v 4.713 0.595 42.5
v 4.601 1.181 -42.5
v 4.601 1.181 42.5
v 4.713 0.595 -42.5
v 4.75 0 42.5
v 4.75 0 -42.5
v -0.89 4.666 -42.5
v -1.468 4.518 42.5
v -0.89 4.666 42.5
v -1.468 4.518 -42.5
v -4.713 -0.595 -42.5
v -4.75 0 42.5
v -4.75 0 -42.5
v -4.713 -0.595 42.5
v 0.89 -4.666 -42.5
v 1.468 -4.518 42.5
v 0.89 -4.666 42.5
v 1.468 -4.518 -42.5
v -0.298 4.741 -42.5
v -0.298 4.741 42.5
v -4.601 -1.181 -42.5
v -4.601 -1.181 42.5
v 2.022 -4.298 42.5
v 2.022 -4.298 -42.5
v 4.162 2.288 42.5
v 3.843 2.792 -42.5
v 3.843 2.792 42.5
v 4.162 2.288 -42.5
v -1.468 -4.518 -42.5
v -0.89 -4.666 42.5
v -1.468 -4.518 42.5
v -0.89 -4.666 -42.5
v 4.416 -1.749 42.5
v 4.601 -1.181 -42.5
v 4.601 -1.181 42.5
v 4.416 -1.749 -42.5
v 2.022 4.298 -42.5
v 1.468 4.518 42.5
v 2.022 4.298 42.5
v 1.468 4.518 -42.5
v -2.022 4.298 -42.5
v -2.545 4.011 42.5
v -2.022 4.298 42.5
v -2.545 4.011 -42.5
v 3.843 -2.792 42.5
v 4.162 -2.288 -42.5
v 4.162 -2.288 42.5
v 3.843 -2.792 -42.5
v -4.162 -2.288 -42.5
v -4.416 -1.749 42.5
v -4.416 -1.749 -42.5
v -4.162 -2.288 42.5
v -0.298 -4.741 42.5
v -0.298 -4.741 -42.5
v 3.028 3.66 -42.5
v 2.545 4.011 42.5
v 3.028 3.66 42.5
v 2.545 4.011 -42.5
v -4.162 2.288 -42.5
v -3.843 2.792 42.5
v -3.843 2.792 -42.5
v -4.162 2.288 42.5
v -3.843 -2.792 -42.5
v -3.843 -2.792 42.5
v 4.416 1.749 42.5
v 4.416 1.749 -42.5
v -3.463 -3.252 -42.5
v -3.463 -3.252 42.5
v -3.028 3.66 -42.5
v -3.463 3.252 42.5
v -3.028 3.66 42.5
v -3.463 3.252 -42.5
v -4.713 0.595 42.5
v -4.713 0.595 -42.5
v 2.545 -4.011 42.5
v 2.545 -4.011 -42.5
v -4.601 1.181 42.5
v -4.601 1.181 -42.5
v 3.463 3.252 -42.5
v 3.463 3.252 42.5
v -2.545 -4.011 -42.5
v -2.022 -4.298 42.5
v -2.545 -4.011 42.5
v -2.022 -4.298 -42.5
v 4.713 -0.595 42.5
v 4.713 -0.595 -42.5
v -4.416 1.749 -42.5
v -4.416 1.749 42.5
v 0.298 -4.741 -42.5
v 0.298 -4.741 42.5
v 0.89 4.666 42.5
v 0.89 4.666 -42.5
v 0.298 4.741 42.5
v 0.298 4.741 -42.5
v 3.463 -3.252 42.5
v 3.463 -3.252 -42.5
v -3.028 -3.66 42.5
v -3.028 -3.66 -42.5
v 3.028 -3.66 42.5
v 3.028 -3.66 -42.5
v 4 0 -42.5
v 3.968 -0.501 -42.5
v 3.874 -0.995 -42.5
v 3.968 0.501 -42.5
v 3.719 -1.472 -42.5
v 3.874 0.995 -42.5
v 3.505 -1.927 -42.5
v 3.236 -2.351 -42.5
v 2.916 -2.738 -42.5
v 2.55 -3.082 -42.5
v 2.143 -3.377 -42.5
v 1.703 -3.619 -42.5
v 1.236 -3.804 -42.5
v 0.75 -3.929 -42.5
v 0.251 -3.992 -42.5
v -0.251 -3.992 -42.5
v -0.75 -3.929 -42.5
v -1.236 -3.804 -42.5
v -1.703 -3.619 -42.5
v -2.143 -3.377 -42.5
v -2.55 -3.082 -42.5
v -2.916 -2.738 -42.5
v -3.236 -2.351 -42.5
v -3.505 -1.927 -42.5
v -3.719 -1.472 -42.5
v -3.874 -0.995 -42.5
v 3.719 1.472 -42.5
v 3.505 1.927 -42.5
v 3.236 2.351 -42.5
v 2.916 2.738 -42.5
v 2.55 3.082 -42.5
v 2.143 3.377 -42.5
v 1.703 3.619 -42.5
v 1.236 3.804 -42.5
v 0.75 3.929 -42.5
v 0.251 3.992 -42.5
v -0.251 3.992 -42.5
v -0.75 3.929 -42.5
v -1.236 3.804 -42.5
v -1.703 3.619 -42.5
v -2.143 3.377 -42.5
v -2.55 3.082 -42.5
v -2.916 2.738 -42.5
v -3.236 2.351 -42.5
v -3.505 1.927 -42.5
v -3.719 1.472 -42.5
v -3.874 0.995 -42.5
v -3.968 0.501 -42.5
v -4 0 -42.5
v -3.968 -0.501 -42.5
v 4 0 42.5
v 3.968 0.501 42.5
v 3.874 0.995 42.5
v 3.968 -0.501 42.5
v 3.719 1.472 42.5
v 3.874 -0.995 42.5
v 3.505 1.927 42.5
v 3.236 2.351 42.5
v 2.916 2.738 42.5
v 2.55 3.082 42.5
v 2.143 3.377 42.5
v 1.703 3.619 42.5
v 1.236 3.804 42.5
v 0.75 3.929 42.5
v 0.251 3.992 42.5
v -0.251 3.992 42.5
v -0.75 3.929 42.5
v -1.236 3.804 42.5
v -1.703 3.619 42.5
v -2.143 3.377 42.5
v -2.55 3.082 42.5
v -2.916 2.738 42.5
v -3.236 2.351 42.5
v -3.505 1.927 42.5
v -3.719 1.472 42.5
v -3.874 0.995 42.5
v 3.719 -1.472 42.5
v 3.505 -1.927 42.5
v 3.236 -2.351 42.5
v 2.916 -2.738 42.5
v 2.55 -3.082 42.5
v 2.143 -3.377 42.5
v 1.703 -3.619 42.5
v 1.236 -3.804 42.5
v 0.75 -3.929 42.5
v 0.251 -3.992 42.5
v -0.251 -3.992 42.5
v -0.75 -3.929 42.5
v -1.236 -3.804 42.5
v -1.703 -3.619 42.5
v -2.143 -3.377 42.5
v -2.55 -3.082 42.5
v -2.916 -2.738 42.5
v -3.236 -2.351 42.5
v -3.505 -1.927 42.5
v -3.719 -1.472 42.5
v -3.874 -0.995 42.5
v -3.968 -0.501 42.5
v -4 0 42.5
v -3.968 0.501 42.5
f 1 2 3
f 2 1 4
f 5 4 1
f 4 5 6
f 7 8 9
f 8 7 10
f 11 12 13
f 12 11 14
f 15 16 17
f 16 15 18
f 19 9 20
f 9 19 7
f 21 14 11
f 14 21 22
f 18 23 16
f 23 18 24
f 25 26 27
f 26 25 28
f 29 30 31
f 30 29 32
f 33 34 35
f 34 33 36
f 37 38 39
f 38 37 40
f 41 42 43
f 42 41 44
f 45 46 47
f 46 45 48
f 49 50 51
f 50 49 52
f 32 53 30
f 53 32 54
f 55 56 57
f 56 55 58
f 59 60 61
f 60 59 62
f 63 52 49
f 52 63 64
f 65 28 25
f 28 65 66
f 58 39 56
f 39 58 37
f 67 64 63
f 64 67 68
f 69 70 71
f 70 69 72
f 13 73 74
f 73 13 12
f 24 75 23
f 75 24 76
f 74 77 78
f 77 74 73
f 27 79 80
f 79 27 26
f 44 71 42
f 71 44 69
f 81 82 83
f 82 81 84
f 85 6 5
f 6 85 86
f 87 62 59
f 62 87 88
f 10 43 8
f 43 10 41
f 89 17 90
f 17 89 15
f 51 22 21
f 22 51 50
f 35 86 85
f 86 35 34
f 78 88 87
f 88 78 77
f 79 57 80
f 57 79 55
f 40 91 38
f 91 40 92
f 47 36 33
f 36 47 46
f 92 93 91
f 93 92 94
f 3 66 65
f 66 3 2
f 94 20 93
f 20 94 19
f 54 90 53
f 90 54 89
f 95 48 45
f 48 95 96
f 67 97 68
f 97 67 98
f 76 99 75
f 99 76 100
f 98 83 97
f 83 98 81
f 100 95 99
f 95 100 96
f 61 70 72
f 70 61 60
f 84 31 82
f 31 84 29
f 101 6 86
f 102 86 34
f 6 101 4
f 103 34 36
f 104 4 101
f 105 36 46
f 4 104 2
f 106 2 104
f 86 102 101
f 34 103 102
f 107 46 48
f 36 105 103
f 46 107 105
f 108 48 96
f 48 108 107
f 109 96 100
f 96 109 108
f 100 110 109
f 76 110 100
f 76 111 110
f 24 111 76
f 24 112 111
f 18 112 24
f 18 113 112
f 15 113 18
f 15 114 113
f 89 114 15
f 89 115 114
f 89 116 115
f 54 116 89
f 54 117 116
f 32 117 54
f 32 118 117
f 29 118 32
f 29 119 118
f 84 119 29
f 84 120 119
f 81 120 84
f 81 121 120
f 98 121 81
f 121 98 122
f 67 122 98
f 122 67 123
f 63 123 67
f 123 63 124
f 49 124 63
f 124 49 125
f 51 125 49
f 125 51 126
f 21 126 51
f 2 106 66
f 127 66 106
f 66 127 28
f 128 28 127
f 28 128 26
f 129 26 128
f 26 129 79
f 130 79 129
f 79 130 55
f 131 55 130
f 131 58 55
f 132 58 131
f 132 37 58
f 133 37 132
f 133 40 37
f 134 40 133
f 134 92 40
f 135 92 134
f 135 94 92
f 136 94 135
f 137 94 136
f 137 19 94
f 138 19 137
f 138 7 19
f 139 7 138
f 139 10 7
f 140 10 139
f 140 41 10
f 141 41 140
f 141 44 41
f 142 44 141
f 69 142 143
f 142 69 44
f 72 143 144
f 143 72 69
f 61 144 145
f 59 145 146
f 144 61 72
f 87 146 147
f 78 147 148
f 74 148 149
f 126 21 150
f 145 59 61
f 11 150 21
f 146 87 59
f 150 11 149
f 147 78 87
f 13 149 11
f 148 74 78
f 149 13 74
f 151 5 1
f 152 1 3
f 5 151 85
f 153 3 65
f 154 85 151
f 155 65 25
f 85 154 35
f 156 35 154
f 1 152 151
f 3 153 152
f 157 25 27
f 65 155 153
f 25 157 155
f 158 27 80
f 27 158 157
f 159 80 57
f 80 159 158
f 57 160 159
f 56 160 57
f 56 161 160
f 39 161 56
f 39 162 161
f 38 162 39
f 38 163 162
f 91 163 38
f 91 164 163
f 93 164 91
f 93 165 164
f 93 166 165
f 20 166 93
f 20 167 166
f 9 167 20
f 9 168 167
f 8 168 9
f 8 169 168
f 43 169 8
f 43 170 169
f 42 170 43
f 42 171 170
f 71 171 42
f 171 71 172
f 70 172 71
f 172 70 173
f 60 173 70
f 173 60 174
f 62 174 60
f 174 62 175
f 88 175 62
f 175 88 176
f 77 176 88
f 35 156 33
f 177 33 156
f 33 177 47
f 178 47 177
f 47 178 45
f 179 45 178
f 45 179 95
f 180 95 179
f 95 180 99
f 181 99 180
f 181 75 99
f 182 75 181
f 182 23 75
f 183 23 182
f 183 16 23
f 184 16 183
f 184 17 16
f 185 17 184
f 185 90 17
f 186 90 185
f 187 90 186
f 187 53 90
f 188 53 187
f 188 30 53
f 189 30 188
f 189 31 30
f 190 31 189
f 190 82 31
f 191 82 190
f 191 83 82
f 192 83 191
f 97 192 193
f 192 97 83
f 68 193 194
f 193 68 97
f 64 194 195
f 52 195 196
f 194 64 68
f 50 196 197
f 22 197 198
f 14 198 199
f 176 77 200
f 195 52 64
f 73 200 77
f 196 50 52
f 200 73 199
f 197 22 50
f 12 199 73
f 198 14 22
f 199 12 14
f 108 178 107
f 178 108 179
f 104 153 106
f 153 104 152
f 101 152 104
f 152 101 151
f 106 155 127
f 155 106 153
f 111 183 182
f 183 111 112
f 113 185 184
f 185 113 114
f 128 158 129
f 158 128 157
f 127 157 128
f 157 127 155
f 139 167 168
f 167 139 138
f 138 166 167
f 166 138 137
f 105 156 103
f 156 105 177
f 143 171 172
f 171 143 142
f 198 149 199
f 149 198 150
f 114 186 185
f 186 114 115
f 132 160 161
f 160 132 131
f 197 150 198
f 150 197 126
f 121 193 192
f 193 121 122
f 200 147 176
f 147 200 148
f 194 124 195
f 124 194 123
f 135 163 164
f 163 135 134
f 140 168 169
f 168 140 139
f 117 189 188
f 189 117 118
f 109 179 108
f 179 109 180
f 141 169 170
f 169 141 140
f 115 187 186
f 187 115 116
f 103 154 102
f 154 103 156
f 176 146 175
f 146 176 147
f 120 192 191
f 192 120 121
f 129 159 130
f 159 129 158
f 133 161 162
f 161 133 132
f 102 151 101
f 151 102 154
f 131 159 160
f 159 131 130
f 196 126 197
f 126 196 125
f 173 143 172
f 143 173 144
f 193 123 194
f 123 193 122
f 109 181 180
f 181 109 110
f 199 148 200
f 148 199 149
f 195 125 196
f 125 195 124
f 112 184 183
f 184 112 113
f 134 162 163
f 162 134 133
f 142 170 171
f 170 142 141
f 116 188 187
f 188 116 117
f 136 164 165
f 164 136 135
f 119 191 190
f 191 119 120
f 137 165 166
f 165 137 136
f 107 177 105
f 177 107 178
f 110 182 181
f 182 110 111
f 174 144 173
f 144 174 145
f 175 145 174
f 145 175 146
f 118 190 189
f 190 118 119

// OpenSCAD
$fn = 50;


difference() {
	union() {
		translate(v = [0, 0, -42.5000000000]) {
			cylinder(h = 85, r = 4.7500000000);
		}
	}
	union() {
		translate(v = [0, 0, -100.0000000000]) {
			cylinder(h = 200, r = 4.0000000000);
		}
	}
}
